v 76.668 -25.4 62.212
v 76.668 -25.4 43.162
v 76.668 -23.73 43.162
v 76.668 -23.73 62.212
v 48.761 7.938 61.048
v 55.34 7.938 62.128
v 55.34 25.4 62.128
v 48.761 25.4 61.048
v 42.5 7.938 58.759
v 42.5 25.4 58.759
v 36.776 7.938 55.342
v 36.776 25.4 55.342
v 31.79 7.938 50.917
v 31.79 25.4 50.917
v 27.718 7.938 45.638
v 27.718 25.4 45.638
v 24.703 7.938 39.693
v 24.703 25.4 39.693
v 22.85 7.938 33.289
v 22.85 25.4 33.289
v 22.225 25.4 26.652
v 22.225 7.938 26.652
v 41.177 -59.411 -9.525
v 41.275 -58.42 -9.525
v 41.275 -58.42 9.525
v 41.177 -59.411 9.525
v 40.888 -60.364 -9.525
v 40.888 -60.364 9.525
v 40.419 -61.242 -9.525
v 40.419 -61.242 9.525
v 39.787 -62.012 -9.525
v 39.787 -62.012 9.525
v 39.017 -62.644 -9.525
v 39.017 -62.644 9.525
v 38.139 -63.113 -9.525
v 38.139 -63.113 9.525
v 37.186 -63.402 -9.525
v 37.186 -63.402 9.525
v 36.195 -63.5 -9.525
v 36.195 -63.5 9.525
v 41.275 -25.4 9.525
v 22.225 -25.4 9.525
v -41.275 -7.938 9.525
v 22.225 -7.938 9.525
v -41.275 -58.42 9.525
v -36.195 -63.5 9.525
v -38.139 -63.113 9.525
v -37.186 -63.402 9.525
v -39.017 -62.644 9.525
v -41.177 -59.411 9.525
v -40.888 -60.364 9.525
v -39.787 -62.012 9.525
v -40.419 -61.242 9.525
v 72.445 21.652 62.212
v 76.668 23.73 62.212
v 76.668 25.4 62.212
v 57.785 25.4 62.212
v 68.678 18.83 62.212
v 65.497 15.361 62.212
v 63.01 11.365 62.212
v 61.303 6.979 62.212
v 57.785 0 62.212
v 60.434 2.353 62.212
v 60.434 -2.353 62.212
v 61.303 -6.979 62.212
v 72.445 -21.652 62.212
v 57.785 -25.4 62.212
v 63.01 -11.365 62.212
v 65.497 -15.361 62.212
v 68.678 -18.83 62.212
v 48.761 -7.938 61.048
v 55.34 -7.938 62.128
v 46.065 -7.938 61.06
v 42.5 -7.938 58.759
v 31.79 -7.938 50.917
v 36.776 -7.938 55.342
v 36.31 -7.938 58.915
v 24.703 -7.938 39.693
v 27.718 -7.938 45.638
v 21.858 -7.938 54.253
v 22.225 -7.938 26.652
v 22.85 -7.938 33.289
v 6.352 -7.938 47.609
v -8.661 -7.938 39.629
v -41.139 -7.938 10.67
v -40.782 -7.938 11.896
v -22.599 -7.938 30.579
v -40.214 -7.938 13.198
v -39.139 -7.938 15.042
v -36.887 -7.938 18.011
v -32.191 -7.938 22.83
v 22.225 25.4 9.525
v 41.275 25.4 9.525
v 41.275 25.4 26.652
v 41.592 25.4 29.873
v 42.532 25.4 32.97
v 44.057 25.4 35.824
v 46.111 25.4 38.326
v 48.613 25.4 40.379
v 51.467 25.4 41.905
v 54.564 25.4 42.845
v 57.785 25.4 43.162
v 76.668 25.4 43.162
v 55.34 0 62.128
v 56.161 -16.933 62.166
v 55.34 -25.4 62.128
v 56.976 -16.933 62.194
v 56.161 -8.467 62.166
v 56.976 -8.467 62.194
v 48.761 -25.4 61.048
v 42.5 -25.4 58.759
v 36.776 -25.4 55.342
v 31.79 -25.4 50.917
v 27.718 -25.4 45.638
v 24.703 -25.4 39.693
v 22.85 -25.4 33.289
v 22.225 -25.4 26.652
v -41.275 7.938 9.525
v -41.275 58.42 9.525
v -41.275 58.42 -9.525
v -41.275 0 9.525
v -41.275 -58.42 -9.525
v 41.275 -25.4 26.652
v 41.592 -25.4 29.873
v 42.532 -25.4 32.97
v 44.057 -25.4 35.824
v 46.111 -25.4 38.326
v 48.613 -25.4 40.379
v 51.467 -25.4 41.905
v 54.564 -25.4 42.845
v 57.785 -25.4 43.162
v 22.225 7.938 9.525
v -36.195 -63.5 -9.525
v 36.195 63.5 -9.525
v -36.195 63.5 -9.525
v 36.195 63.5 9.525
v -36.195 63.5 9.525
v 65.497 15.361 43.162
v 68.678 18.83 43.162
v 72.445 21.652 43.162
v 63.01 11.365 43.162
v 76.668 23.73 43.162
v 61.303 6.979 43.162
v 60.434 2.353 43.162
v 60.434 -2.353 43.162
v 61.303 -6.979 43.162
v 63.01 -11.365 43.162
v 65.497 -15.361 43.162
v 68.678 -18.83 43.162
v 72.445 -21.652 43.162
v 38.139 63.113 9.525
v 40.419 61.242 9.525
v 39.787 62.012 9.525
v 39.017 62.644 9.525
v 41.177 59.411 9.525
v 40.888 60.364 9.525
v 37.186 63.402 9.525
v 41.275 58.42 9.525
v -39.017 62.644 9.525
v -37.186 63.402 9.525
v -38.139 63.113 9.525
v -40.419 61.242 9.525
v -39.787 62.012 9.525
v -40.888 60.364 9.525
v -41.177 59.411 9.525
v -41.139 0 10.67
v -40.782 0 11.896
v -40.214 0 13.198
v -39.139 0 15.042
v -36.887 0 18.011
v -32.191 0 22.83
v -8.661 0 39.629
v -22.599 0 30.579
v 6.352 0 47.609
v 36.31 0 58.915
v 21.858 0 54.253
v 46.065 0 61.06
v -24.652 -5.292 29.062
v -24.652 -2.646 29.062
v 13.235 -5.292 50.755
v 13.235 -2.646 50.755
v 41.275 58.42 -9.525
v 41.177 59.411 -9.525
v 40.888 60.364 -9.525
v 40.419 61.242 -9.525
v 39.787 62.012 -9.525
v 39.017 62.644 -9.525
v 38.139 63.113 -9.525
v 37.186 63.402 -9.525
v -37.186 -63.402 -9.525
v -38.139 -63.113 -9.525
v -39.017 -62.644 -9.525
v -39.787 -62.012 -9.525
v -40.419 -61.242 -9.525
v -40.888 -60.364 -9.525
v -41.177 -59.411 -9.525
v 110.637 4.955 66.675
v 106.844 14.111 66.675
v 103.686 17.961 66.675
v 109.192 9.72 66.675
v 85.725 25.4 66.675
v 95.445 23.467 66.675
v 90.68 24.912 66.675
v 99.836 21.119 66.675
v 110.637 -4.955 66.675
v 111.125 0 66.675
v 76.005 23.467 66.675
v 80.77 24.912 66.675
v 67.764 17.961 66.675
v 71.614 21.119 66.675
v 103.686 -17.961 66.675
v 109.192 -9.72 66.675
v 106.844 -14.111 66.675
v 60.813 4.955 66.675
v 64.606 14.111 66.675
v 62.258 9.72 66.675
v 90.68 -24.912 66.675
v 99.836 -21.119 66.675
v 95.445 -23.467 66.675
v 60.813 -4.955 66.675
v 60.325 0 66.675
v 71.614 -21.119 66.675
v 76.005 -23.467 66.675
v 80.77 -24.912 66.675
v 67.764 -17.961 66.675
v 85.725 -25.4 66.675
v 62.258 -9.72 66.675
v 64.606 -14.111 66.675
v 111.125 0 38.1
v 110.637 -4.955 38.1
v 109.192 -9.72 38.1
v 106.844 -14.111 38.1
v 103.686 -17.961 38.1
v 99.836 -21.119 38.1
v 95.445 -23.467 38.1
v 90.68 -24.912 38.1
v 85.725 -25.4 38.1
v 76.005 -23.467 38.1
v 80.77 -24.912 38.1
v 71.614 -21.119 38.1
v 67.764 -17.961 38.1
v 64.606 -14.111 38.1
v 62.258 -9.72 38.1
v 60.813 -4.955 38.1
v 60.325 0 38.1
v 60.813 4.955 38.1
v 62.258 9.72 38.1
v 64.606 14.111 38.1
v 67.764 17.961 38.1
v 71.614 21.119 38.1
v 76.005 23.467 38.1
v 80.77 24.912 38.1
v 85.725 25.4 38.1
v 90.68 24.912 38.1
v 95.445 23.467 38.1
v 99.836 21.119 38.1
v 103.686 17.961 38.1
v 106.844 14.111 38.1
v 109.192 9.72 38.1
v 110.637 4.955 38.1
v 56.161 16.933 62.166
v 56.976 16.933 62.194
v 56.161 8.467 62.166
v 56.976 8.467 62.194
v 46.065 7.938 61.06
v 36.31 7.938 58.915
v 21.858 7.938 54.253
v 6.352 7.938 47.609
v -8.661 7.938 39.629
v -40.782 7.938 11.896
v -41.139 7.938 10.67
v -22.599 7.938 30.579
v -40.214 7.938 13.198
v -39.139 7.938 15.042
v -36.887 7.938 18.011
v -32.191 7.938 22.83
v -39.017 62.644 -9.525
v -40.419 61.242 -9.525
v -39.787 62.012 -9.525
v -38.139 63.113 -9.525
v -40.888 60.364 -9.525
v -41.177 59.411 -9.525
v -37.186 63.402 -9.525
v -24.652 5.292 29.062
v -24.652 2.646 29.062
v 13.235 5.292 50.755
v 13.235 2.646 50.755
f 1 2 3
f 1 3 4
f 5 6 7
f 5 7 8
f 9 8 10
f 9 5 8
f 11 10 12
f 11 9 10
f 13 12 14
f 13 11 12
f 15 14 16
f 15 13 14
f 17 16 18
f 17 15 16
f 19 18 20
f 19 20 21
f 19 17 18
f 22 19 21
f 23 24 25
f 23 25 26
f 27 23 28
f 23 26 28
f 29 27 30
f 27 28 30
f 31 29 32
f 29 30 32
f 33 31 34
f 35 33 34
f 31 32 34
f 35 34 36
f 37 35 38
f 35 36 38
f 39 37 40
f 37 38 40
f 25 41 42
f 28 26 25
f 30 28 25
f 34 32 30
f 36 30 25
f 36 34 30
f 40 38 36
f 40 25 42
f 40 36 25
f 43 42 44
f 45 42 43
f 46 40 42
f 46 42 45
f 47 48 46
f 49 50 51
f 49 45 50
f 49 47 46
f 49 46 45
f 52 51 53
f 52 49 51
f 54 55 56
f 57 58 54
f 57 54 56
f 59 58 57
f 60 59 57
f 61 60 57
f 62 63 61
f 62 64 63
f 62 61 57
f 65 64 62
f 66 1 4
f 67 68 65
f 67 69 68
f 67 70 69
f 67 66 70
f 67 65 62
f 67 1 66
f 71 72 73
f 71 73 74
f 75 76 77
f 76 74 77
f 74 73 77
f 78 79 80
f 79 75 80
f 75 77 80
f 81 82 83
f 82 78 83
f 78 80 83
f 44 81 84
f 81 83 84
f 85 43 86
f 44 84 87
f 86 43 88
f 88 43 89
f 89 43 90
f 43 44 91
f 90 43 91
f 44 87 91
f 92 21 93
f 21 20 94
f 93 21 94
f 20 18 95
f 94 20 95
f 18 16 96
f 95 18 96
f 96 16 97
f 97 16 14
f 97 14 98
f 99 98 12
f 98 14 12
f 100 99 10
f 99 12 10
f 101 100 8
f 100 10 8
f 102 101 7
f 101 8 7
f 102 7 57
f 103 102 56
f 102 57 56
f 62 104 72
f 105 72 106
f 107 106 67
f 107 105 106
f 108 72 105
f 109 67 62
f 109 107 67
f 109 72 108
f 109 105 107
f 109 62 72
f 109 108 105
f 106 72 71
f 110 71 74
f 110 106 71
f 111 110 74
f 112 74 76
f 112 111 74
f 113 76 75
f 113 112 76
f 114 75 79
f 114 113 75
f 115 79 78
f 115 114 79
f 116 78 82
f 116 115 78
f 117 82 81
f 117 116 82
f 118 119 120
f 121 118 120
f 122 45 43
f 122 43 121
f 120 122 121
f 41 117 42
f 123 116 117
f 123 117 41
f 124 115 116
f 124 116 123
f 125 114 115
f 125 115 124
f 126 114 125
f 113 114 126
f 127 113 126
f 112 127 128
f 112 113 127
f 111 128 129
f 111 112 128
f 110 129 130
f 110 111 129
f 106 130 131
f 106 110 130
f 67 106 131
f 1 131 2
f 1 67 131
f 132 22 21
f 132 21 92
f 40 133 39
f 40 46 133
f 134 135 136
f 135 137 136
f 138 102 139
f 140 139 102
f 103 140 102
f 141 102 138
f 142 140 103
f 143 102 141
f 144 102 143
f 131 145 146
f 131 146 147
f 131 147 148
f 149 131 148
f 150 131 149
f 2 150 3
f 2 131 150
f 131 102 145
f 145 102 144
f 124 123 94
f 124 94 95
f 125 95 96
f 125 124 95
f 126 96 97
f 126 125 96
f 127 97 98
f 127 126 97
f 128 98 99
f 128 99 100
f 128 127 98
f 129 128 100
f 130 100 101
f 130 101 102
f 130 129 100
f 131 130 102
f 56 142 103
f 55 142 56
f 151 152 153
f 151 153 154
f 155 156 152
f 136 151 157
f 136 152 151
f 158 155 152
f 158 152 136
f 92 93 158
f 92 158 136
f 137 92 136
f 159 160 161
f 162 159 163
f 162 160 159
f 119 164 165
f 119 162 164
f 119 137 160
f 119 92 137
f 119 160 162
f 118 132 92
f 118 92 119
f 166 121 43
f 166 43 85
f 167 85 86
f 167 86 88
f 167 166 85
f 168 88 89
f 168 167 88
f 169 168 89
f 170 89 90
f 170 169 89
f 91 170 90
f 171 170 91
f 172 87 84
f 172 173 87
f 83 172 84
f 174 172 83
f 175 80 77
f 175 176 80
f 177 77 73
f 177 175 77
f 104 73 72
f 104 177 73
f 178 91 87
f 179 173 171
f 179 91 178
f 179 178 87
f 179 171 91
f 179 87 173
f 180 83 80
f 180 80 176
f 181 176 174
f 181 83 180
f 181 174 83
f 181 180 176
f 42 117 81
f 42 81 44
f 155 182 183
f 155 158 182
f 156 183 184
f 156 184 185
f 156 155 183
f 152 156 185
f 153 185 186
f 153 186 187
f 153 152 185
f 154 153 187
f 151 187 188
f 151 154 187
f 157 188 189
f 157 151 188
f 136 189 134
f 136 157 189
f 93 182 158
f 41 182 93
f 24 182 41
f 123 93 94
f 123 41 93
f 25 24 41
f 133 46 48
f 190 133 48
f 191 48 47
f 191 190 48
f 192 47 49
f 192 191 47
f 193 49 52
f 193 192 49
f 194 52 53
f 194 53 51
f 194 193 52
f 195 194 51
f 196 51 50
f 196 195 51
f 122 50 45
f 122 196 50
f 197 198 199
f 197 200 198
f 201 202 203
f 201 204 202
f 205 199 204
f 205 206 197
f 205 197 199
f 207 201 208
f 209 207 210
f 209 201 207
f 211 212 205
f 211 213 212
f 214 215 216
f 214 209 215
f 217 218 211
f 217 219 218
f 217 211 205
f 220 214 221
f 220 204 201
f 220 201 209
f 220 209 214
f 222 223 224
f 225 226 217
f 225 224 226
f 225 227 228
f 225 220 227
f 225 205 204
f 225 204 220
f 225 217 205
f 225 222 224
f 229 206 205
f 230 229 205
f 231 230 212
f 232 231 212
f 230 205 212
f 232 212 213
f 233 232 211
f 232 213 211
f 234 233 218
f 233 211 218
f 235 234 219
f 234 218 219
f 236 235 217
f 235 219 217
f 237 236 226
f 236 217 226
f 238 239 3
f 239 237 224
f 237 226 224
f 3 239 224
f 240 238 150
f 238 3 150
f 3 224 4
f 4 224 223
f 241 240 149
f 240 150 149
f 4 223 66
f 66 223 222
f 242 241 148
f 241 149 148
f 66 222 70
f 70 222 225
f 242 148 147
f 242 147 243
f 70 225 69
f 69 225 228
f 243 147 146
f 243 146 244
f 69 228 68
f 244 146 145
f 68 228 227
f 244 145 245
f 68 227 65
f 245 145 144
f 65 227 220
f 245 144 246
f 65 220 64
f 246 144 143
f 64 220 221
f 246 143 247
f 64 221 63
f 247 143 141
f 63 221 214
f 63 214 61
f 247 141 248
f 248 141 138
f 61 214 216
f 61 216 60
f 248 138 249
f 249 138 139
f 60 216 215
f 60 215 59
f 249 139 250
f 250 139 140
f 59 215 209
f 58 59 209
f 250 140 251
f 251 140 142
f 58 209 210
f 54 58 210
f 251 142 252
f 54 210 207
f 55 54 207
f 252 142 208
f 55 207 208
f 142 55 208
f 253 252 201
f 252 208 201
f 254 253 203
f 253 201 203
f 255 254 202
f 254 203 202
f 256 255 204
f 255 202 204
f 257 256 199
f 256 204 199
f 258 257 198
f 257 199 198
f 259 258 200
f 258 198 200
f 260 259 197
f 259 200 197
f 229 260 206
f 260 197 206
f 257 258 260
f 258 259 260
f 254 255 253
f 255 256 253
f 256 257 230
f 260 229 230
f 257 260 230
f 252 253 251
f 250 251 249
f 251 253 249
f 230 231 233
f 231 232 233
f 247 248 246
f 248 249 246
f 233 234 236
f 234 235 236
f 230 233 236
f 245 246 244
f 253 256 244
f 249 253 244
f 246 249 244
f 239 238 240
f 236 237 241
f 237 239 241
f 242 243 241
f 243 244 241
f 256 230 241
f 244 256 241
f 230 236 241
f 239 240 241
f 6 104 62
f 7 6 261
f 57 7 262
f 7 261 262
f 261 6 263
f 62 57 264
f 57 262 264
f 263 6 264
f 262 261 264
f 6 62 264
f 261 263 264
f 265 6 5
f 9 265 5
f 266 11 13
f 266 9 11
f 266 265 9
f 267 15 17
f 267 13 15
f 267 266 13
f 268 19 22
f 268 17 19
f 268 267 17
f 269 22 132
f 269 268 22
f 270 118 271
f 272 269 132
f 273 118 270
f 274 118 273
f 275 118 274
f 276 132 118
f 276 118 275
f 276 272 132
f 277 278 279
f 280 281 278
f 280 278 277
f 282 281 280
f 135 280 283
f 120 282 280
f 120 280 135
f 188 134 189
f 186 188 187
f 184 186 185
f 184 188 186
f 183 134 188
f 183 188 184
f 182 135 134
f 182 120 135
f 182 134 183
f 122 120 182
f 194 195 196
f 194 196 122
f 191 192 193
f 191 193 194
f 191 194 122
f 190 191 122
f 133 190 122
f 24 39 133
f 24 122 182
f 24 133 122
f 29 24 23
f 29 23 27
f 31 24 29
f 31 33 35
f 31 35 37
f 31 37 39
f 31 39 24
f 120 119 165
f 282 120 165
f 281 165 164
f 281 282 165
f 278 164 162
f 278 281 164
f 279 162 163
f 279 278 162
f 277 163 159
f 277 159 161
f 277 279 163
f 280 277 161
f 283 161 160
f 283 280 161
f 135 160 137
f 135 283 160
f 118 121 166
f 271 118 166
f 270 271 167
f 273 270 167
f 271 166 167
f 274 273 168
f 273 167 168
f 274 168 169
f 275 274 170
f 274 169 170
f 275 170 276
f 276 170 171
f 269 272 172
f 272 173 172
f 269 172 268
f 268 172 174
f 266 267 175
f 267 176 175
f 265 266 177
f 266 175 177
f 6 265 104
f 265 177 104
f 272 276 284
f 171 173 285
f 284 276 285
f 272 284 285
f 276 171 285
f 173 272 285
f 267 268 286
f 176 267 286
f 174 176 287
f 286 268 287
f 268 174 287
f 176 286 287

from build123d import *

# Parameters (mm, degrees)
F1_DEPTH = 63.5
F0_W     = 16.342798
F0_H     = 19.05
F2_DEPTH = 25.4
F3_DEPTH = 7.9375
F0_W_2   = 25.4
F0_H_2   = 28.575
F5_R     = 5.08


with BuildPart() as f1:
    # F0 (on Front) → F1 (new body, symmetric)
    with BuildSketch(Plane.XZ):
        Polygon((-41.275, -9.525), (41.275, -9.525), (41.275, 9.525), (22.225, 9.525), (-41.275, 9.525), align=None)
    extrude(amount=F1_DEPTH, both=True)

    # F0 (on Front) → F2 (join, symmetric)
    with BuildSketch(Plane.XZ):
        with BuildLine():
            Line((22.225, 9.525), (41.275, 9.525))
            Line((41.275, 9.525), (41.275, 26.651896))
            ThreePointArc((41.275, 26.651896), (46.110667, 38.326229), (57.785, 43.161896))
            Line((57.785, 43.161896), (60.325, 43.161896))
            Line((60.325, 43.161896), (60.325, 62.211896))
            Line((60.325, 62.211896), (57.785, 62.211896))
            add(Edge.make_bspline(
                [(55.339805, 62.127728), (56.163925, 62.171613), (56.97924, 62.199852), (57.785, 62.211896)],
                knots=[109.850246, 109.850246, 109.850246, 109.850246, 112.199789, 112.199789, 112.199789, 112.199789], degree=3))
            ThreePointArc((55.339805, 62.127728), (31.790147, 50.916711), (22.225, 26.651896))
            Line((22.225, 26.651896), (22.225, 9.525))
        make_face()
        with Locations((68.496399, 52.686896)):
            Rectangle(F0_W, F0_H)
    extrude(amount=F2_DEPTH, both=True)

    # F0 (on Front) → F3 (join, symmetric)
    with BuildSketch(Plane.XZ):
        with BuildLine():
            add(Edge.make_bspline(
                [(-41.275, 9.525), (-40.967457, 23.823205), (16.809013, 60.07592), (55.339805, 62.127728)],
                knots=[0, 0, 0, 0, 109.850246, 109.850246, 109.850246, 109.850246], degree=3))
            Line((-41.275, 9.525), (22.225, 9.525))
            Line((22.225, 9.525), (22.225, 26.651896))
            ThreePointArc((22.225, 26.651896), (31.790147, 50.916711), (55.339805, 62.127728))
        make_face()
    extrude(amount=F3_DEPTH, both=True)

    # F0 (on Front) → F4 (revolve)
    with BuildSketch(Plane.XZ):
        with Locations((98.425, 52.3875)):
            Rectangle(F0_W_2, F0_H_2)
    revolve(axis=Axis((85.725, 0, 52.187027), (0, 0, -1)))

    # F5
    f5_edges = [f1.edges().sort_by_distance(p)[0] for p in [
        (41.275, -63.5, 0),
        (41.275, 63.5, 0),
        (-41.275, -63.5, 0),
        (-41.275, 63.5, 0),
    ]]
    fillet(f5_edges, radius=F5_R)


solid = f1.part
